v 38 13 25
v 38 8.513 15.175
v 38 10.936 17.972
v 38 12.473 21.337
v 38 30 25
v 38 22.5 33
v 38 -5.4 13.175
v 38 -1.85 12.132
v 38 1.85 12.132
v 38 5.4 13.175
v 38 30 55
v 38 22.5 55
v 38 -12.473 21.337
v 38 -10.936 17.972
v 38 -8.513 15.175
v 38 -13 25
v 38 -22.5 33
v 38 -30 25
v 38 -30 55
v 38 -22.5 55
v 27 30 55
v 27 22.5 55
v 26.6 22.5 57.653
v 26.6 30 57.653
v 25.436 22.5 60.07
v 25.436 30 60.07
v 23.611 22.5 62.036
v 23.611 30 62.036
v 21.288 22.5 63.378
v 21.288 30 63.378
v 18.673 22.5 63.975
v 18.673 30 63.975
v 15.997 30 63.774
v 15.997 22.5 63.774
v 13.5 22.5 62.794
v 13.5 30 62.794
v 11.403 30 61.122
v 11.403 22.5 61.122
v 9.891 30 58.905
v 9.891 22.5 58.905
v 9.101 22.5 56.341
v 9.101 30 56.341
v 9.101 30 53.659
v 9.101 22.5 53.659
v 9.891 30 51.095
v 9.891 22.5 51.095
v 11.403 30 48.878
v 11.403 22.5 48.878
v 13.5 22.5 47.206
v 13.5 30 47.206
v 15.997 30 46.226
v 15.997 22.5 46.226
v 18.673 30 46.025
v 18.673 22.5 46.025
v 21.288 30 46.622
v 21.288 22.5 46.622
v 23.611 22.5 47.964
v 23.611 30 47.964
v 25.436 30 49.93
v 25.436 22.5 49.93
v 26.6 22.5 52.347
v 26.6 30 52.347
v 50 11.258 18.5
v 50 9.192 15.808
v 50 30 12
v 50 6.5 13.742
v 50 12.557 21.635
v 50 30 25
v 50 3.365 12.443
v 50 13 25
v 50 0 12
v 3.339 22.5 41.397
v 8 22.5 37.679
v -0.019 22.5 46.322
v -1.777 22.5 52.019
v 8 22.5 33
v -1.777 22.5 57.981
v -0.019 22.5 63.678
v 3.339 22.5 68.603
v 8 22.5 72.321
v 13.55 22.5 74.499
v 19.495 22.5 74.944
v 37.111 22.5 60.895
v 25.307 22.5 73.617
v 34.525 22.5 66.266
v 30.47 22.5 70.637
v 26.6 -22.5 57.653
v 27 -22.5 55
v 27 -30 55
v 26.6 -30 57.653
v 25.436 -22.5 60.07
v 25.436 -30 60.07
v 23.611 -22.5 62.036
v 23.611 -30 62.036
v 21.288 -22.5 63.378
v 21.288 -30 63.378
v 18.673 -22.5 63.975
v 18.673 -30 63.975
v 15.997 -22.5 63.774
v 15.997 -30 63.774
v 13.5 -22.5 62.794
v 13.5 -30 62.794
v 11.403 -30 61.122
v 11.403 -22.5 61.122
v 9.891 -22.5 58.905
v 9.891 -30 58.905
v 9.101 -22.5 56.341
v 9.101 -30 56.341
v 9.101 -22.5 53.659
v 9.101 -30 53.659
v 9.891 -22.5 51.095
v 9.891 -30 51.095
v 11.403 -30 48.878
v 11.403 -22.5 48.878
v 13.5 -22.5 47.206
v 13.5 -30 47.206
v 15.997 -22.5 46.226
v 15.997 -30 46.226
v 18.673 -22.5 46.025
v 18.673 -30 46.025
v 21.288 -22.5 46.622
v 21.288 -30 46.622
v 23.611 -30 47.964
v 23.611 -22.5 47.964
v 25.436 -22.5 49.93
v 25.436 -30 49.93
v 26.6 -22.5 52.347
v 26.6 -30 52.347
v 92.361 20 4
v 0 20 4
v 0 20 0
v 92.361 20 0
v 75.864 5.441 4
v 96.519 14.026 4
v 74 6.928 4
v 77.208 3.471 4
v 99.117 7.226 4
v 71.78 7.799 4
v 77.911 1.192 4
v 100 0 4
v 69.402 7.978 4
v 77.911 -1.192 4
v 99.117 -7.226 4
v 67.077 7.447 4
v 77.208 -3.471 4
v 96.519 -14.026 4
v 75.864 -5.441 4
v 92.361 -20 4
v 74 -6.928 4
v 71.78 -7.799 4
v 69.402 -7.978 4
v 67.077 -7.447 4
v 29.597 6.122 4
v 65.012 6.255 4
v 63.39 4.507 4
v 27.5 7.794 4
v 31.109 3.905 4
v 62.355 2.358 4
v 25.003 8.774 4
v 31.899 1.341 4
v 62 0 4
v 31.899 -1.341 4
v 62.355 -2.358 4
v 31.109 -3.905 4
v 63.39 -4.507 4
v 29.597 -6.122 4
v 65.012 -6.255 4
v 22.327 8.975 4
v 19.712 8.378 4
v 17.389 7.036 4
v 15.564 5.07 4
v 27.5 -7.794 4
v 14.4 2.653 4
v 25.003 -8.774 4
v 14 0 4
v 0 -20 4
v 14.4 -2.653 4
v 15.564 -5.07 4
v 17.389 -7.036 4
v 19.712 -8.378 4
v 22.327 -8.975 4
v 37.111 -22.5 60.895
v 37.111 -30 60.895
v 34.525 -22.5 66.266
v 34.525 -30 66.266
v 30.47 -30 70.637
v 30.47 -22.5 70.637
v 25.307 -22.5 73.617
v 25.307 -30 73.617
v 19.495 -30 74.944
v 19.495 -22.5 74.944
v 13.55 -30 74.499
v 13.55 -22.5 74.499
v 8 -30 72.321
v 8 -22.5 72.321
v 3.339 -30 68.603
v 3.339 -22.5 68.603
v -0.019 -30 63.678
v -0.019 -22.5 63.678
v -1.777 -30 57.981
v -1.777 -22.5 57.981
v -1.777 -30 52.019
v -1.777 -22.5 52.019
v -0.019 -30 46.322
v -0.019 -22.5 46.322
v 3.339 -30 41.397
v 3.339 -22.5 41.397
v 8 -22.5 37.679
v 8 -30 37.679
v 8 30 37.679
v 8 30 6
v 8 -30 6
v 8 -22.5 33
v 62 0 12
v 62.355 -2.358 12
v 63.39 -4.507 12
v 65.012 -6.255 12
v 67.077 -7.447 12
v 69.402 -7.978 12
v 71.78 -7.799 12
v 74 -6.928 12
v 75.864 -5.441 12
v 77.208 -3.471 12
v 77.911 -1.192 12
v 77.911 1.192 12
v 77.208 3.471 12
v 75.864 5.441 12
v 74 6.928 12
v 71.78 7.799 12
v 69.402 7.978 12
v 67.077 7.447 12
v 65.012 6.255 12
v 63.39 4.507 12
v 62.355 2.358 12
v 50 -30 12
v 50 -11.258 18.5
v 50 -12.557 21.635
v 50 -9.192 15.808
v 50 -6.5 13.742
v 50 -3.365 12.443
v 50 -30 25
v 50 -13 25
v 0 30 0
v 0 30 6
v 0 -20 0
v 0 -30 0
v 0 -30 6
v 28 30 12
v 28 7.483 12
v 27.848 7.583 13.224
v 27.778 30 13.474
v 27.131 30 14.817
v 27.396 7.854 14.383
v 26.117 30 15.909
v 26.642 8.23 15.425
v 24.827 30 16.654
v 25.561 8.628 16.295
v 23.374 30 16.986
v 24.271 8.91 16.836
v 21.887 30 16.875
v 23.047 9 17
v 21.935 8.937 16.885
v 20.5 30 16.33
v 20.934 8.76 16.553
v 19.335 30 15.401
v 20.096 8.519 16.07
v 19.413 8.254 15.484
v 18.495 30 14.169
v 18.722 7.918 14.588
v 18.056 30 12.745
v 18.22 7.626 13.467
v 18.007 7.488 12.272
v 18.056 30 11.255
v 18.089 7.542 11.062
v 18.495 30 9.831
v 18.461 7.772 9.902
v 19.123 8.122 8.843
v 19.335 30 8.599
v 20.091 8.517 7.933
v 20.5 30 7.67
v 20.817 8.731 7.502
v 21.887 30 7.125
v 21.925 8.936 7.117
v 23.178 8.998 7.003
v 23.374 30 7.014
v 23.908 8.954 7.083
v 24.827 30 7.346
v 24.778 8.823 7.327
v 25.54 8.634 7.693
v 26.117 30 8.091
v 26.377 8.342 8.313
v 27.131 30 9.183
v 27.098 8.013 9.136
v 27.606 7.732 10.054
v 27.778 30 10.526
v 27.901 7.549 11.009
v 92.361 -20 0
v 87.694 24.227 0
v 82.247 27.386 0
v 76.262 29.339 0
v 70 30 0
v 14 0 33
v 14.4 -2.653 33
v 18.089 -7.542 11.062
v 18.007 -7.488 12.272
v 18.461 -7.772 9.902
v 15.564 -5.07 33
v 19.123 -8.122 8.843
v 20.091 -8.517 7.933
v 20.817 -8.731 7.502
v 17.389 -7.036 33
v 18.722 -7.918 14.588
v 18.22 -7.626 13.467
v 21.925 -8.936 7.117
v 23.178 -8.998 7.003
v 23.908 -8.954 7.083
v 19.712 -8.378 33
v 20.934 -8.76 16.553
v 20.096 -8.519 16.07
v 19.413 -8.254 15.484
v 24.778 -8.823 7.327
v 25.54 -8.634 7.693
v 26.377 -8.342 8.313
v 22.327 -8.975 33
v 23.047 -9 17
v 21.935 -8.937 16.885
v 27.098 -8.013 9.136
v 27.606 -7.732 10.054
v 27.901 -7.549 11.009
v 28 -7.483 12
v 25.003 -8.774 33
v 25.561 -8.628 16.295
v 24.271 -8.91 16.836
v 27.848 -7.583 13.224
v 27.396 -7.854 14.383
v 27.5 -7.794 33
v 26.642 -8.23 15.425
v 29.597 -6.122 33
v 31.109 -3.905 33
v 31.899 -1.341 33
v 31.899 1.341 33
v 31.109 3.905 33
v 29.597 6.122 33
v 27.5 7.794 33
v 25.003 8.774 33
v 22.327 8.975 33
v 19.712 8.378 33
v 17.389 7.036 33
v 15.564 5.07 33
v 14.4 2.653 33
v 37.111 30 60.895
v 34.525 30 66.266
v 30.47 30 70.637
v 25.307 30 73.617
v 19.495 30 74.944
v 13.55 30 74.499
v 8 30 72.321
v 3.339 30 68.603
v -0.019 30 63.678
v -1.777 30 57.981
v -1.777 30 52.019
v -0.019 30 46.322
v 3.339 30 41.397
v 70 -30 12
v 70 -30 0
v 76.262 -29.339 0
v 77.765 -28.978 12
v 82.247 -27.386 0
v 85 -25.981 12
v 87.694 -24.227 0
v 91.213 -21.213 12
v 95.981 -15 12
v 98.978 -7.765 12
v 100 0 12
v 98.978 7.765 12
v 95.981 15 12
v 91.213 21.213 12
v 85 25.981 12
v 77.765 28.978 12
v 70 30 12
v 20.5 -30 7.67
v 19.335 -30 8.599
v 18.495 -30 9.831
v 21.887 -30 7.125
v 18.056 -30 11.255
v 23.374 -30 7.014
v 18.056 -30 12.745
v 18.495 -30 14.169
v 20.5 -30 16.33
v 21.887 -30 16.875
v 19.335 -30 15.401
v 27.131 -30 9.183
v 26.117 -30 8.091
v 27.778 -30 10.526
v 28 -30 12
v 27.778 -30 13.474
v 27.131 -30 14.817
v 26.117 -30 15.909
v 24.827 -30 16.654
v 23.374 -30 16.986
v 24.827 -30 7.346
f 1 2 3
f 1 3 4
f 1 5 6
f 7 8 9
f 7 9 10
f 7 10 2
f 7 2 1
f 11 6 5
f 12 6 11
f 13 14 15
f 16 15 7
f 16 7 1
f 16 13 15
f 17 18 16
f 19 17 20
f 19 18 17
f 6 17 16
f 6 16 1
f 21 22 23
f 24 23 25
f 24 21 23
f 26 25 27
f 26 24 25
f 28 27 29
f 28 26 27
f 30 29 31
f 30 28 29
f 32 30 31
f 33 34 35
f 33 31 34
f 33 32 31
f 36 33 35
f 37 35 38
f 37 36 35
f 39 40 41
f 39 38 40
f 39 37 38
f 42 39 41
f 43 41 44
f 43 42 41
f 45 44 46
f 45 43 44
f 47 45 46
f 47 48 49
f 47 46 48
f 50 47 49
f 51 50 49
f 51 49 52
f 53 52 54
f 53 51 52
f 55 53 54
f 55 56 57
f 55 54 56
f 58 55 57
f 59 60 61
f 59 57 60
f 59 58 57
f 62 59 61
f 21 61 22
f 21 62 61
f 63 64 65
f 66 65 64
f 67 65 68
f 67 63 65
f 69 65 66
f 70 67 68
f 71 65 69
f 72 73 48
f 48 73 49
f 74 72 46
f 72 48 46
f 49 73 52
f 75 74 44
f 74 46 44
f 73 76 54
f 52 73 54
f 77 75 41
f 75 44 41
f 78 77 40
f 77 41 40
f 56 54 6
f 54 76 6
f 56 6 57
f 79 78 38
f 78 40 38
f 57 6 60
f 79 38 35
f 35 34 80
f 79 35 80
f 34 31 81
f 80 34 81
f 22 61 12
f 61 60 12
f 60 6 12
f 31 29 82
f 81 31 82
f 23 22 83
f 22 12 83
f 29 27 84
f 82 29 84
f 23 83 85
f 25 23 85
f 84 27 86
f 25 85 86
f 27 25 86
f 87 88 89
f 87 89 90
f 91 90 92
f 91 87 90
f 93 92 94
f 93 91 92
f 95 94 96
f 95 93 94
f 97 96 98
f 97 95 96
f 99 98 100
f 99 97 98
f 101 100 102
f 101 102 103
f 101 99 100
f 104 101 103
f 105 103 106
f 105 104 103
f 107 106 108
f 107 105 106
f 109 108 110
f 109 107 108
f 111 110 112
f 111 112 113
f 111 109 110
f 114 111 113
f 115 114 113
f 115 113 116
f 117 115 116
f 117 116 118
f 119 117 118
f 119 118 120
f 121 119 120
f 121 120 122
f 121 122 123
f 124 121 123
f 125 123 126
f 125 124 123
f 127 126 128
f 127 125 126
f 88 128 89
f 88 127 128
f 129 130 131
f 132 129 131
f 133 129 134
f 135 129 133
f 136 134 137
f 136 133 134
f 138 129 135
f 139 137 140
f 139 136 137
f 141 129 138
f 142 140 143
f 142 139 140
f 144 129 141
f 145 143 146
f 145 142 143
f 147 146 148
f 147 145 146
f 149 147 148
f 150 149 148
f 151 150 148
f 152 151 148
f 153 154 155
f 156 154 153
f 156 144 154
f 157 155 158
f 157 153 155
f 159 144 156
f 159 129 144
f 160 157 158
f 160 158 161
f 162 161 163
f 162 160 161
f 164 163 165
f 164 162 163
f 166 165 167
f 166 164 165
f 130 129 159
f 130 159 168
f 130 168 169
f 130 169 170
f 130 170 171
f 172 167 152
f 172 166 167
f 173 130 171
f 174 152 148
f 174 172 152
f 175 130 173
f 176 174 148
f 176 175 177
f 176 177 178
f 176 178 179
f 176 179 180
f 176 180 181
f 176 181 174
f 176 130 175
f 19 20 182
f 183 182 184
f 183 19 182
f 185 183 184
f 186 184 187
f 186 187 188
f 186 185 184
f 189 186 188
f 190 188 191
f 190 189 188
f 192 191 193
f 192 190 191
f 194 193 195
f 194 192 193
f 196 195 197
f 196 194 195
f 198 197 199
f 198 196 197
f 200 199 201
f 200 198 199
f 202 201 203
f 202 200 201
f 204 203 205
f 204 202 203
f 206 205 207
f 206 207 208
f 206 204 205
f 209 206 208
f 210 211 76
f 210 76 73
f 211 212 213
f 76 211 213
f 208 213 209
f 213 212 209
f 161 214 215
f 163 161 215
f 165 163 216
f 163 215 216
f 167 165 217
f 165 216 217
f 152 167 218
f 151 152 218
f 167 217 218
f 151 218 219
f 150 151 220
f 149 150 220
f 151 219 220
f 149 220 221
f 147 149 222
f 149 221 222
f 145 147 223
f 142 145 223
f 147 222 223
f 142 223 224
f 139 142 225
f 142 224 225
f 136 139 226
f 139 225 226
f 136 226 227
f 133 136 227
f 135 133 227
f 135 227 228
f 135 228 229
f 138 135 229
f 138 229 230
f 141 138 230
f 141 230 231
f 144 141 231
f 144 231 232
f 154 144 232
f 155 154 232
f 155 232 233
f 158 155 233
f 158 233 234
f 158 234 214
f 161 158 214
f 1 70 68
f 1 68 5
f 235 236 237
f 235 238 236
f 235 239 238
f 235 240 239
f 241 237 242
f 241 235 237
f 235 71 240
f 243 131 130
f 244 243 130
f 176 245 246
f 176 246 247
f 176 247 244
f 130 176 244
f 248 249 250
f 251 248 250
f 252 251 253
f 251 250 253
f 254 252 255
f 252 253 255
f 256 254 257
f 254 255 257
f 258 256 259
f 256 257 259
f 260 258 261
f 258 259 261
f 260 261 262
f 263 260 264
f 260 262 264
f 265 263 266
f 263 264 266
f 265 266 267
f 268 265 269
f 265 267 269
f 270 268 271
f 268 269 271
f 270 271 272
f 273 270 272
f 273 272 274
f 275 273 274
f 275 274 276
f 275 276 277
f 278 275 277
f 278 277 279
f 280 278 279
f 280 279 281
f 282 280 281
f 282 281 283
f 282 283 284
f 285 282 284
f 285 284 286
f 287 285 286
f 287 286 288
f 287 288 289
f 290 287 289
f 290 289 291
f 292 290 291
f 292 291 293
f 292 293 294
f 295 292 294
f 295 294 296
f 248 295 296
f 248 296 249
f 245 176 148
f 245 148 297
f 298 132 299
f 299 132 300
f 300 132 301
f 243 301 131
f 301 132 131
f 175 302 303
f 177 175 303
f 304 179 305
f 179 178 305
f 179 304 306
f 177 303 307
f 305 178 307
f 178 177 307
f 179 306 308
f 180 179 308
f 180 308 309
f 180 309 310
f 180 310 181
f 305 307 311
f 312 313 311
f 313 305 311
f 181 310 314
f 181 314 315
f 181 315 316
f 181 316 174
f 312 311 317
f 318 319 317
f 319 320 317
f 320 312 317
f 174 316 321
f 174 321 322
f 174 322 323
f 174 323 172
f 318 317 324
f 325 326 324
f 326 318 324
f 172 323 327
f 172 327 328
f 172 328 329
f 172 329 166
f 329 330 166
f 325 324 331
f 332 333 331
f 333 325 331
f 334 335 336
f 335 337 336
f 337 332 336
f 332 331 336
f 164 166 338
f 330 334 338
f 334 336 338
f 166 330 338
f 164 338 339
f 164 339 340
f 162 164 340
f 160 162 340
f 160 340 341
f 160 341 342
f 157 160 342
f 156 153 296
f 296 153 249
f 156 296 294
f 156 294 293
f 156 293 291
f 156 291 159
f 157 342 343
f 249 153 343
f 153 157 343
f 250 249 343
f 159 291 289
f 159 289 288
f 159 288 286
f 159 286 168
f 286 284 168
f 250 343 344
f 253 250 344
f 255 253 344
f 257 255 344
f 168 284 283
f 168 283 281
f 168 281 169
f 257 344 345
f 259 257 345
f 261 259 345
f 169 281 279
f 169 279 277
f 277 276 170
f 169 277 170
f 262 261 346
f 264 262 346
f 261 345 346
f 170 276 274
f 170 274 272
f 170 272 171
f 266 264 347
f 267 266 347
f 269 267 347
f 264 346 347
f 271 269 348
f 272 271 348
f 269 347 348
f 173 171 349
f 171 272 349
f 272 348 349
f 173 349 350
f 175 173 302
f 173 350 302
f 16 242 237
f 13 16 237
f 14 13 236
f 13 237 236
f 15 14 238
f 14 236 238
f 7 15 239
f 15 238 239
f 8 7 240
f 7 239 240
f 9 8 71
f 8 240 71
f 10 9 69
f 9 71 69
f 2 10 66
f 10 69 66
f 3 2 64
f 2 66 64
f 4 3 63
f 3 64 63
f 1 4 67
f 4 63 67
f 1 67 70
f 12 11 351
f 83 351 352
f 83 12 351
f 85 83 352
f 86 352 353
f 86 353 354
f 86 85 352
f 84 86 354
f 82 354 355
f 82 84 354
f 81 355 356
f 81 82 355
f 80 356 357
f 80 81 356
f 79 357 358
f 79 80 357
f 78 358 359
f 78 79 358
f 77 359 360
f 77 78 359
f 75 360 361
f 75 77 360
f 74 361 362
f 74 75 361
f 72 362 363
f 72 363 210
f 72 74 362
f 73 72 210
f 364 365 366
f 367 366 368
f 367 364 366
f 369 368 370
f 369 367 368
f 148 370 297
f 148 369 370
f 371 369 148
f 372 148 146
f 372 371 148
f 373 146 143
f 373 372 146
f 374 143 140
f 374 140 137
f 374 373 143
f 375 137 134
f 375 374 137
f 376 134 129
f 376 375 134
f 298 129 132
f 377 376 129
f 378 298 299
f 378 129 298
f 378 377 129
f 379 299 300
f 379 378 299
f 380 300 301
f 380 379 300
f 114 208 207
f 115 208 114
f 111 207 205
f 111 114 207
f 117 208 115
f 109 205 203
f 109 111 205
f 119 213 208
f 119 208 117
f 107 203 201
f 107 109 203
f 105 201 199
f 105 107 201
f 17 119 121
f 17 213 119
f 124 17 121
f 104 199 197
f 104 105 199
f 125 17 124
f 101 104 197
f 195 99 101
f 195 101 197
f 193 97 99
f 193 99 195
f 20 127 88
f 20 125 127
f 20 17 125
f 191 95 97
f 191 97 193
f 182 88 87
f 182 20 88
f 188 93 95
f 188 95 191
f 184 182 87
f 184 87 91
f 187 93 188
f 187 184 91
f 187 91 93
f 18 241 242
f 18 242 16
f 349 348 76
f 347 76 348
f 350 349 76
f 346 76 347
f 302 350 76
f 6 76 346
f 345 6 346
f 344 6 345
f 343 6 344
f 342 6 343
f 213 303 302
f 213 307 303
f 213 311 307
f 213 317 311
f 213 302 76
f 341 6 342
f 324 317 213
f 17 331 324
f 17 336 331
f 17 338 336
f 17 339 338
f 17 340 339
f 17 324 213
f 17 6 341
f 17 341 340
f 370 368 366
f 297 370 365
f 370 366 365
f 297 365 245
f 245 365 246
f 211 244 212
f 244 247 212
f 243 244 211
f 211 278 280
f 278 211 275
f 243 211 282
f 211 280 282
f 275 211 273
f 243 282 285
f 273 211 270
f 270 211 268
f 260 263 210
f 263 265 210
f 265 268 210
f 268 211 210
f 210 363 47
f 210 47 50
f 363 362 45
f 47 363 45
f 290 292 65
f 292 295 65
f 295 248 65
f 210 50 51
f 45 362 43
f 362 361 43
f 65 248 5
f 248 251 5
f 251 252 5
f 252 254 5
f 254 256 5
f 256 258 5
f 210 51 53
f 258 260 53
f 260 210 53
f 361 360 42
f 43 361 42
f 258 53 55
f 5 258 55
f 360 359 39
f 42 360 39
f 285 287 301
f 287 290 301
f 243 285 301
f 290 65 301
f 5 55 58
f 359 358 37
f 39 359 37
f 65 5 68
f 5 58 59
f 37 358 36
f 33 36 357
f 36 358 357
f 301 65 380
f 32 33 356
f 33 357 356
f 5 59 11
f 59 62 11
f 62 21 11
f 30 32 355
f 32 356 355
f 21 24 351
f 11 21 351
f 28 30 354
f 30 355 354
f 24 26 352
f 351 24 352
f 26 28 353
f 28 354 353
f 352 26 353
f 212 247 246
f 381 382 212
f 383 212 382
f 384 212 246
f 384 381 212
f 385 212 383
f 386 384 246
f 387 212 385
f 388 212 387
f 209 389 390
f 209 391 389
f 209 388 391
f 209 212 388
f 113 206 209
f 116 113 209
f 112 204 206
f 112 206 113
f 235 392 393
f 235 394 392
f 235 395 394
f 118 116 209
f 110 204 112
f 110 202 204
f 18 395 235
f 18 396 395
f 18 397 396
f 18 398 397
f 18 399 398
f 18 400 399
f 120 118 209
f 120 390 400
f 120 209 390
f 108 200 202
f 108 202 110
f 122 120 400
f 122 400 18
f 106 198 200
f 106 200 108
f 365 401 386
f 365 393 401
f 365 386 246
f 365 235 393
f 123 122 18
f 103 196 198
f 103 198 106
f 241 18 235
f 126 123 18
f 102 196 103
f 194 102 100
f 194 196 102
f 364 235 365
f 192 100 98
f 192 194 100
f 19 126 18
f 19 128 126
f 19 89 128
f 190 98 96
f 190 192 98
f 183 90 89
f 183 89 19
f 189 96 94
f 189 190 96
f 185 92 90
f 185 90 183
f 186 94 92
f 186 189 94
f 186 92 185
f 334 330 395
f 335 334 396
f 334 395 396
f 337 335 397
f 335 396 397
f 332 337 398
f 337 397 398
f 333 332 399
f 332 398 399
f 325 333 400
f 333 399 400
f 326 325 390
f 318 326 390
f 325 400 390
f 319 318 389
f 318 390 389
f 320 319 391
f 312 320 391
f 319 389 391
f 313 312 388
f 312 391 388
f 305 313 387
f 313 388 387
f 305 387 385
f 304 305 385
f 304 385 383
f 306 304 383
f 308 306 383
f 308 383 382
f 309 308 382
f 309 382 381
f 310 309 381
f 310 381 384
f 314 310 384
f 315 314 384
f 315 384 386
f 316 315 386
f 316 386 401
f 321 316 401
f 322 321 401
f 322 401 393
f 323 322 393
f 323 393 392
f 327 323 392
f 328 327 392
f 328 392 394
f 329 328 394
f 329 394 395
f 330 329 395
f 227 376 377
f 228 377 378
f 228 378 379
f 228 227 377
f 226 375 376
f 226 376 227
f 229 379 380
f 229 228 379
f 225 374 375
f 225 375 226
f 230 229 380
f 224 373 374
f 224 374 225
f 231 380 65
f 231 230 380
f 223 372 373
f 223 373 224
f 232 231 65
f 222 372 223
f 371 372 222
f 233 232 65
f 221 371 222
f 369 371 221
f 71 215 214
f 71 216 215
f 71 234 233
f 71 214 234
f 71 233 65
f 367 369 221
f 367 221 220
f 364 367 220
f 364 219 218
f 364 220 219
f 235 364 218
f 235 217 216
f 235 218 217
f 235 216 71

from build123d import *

# Parameters (mm, degrees)
SKETCH_R        = 9
PAD_DEPTH       = 30
SKETCH001_W     = 55.131706
SKETCH001_H     = 45
POCKET_DEPTH    = 40.001
SKETCH002_R     = 5
POCKET001_DEPTH = 60.001
SKETCH003_R     = 9
POCKET002_DEPTH = 33.001
PAD001_DEPTH    = 12
SKETCH005_W     = 9.754251
SKETCH005_H     = 40
POCKET003_DEPTH = 100.001
SKETCH006_R     = 13
POCKET004_DEPTH = 12
SKETCH007_R     = 8
POCKET005_DEPTH = 12.001


with BuildPart() as part:
    # Sketch → Pad (new body, symmetric)
    with BuildSketch(Plane.XZ):
        with BuildLine():
            Line((0, 0), (70, 0))
            Line((70, 0), (70, 12))
            Line((70, 12), (50, 12))
            Line((50, 12), (50, 25))
            Line((50, 25), (38, 25))
            Line((38, 25), (38, 55))
            ThreePointArc((38, 55), (8, 72.320508), (8, 37.679492))
            Line((8, 6), (8, 37.679492))
            Line((0, 6), (8, 6))
            Line((0, 0), (0, 6))
        make_face()
        with Locations((18, 55)):
            Circle(SKETCH_R, mode=Mode.SUBTRACT)
    extrude(amount=PAD_DEPTH, both=True)

    # Sketch001 → Pocket (cut, through all)
    with BuildSketch(Plane(origin=(38, 0, 0), x_dir=(0, 0, 1), z_dir=(1, 0, 0))):
        with Locations((60.565853, 0)):
            Rectangle(SKETCH001_W, SKETCH001_H)
    extrude(amount=-POCKET_DEPTH, mode=Mode.SUBTRACT)

    # Sketch002 → Pocket001 (cut, through all)
    with BuildSketch(Plane.XZ.offset(30)):
        with Locations((23, 12)):
            Circle(SKETCH002_R)
    extrude(amount=-POCKET001_DEPTH, mode=Mode.SUBTRACT)

    # Sketch003 → Pocket002 (cut, through all)
    with BuildSketch(Plane(origin=(0, 0, 33), x_dir=(-1, 0, 0), z_dir=(0, 0, 1))):
        with Locations((-23, 0)):
            Circle(SKETCH003_R)
    extrude(amount=-POCKET002_DEPTH, mode=Mode.SUBTRACT)

    # Sketch004 → Pad001 (new body)
    with BuildSketch(Plane(origin=(0, 0, 12), x_dir=(-1, 0, 0), z_dir=(0, 0, 1))):
        with BuildLine():
            ThreePointArc((-70, 30), (-100, 0), (-70, -30))
            Line((-70, 30), (-70, -30))
        make_face()
    extrude(amount=-PAD001_DEPTH)

    # Sketch005 → Pocket003 (cut, through all)
    with BuildSketch(Plane(origin=(0, 0, 0), x_dir=(0, 0, -1), z_dir=(-1, 0, 0))):
        with Locations((0.877126, 0)):
            Rectangle(SKETCH005_W, SKETCH005_H)
    extrude(amount=-POCKET003_DEPTH, mode=Mode.SUBTRACT)

    # Sketch006 → Pocket004 (cut)
    with BuildSketch(Plane(origin=(50, 0, 0), x_dir=(0, 0, 1), z_dir=(1, 0, 0))):
        with Locations((25, 0)):
            Circle(SKETCH006_R)
    extrude(amount=-POCKET004_DEPTH, mode=Mode.SUBTRACT)

    # Sketch007 → Pocket005 (cut, through all)
    with BuildSketch(Plane(origin=(0, 0, 12), x_dir=(-1, 0, 0), z_dir=(0, 0, 1))):
        with Locations((-70, 0)):
            Circle(SKETCH007_R)
    extrude(amount=-POCKET005_DEPTH, mode=Mode.SUBTRACT)


solid = part.part
